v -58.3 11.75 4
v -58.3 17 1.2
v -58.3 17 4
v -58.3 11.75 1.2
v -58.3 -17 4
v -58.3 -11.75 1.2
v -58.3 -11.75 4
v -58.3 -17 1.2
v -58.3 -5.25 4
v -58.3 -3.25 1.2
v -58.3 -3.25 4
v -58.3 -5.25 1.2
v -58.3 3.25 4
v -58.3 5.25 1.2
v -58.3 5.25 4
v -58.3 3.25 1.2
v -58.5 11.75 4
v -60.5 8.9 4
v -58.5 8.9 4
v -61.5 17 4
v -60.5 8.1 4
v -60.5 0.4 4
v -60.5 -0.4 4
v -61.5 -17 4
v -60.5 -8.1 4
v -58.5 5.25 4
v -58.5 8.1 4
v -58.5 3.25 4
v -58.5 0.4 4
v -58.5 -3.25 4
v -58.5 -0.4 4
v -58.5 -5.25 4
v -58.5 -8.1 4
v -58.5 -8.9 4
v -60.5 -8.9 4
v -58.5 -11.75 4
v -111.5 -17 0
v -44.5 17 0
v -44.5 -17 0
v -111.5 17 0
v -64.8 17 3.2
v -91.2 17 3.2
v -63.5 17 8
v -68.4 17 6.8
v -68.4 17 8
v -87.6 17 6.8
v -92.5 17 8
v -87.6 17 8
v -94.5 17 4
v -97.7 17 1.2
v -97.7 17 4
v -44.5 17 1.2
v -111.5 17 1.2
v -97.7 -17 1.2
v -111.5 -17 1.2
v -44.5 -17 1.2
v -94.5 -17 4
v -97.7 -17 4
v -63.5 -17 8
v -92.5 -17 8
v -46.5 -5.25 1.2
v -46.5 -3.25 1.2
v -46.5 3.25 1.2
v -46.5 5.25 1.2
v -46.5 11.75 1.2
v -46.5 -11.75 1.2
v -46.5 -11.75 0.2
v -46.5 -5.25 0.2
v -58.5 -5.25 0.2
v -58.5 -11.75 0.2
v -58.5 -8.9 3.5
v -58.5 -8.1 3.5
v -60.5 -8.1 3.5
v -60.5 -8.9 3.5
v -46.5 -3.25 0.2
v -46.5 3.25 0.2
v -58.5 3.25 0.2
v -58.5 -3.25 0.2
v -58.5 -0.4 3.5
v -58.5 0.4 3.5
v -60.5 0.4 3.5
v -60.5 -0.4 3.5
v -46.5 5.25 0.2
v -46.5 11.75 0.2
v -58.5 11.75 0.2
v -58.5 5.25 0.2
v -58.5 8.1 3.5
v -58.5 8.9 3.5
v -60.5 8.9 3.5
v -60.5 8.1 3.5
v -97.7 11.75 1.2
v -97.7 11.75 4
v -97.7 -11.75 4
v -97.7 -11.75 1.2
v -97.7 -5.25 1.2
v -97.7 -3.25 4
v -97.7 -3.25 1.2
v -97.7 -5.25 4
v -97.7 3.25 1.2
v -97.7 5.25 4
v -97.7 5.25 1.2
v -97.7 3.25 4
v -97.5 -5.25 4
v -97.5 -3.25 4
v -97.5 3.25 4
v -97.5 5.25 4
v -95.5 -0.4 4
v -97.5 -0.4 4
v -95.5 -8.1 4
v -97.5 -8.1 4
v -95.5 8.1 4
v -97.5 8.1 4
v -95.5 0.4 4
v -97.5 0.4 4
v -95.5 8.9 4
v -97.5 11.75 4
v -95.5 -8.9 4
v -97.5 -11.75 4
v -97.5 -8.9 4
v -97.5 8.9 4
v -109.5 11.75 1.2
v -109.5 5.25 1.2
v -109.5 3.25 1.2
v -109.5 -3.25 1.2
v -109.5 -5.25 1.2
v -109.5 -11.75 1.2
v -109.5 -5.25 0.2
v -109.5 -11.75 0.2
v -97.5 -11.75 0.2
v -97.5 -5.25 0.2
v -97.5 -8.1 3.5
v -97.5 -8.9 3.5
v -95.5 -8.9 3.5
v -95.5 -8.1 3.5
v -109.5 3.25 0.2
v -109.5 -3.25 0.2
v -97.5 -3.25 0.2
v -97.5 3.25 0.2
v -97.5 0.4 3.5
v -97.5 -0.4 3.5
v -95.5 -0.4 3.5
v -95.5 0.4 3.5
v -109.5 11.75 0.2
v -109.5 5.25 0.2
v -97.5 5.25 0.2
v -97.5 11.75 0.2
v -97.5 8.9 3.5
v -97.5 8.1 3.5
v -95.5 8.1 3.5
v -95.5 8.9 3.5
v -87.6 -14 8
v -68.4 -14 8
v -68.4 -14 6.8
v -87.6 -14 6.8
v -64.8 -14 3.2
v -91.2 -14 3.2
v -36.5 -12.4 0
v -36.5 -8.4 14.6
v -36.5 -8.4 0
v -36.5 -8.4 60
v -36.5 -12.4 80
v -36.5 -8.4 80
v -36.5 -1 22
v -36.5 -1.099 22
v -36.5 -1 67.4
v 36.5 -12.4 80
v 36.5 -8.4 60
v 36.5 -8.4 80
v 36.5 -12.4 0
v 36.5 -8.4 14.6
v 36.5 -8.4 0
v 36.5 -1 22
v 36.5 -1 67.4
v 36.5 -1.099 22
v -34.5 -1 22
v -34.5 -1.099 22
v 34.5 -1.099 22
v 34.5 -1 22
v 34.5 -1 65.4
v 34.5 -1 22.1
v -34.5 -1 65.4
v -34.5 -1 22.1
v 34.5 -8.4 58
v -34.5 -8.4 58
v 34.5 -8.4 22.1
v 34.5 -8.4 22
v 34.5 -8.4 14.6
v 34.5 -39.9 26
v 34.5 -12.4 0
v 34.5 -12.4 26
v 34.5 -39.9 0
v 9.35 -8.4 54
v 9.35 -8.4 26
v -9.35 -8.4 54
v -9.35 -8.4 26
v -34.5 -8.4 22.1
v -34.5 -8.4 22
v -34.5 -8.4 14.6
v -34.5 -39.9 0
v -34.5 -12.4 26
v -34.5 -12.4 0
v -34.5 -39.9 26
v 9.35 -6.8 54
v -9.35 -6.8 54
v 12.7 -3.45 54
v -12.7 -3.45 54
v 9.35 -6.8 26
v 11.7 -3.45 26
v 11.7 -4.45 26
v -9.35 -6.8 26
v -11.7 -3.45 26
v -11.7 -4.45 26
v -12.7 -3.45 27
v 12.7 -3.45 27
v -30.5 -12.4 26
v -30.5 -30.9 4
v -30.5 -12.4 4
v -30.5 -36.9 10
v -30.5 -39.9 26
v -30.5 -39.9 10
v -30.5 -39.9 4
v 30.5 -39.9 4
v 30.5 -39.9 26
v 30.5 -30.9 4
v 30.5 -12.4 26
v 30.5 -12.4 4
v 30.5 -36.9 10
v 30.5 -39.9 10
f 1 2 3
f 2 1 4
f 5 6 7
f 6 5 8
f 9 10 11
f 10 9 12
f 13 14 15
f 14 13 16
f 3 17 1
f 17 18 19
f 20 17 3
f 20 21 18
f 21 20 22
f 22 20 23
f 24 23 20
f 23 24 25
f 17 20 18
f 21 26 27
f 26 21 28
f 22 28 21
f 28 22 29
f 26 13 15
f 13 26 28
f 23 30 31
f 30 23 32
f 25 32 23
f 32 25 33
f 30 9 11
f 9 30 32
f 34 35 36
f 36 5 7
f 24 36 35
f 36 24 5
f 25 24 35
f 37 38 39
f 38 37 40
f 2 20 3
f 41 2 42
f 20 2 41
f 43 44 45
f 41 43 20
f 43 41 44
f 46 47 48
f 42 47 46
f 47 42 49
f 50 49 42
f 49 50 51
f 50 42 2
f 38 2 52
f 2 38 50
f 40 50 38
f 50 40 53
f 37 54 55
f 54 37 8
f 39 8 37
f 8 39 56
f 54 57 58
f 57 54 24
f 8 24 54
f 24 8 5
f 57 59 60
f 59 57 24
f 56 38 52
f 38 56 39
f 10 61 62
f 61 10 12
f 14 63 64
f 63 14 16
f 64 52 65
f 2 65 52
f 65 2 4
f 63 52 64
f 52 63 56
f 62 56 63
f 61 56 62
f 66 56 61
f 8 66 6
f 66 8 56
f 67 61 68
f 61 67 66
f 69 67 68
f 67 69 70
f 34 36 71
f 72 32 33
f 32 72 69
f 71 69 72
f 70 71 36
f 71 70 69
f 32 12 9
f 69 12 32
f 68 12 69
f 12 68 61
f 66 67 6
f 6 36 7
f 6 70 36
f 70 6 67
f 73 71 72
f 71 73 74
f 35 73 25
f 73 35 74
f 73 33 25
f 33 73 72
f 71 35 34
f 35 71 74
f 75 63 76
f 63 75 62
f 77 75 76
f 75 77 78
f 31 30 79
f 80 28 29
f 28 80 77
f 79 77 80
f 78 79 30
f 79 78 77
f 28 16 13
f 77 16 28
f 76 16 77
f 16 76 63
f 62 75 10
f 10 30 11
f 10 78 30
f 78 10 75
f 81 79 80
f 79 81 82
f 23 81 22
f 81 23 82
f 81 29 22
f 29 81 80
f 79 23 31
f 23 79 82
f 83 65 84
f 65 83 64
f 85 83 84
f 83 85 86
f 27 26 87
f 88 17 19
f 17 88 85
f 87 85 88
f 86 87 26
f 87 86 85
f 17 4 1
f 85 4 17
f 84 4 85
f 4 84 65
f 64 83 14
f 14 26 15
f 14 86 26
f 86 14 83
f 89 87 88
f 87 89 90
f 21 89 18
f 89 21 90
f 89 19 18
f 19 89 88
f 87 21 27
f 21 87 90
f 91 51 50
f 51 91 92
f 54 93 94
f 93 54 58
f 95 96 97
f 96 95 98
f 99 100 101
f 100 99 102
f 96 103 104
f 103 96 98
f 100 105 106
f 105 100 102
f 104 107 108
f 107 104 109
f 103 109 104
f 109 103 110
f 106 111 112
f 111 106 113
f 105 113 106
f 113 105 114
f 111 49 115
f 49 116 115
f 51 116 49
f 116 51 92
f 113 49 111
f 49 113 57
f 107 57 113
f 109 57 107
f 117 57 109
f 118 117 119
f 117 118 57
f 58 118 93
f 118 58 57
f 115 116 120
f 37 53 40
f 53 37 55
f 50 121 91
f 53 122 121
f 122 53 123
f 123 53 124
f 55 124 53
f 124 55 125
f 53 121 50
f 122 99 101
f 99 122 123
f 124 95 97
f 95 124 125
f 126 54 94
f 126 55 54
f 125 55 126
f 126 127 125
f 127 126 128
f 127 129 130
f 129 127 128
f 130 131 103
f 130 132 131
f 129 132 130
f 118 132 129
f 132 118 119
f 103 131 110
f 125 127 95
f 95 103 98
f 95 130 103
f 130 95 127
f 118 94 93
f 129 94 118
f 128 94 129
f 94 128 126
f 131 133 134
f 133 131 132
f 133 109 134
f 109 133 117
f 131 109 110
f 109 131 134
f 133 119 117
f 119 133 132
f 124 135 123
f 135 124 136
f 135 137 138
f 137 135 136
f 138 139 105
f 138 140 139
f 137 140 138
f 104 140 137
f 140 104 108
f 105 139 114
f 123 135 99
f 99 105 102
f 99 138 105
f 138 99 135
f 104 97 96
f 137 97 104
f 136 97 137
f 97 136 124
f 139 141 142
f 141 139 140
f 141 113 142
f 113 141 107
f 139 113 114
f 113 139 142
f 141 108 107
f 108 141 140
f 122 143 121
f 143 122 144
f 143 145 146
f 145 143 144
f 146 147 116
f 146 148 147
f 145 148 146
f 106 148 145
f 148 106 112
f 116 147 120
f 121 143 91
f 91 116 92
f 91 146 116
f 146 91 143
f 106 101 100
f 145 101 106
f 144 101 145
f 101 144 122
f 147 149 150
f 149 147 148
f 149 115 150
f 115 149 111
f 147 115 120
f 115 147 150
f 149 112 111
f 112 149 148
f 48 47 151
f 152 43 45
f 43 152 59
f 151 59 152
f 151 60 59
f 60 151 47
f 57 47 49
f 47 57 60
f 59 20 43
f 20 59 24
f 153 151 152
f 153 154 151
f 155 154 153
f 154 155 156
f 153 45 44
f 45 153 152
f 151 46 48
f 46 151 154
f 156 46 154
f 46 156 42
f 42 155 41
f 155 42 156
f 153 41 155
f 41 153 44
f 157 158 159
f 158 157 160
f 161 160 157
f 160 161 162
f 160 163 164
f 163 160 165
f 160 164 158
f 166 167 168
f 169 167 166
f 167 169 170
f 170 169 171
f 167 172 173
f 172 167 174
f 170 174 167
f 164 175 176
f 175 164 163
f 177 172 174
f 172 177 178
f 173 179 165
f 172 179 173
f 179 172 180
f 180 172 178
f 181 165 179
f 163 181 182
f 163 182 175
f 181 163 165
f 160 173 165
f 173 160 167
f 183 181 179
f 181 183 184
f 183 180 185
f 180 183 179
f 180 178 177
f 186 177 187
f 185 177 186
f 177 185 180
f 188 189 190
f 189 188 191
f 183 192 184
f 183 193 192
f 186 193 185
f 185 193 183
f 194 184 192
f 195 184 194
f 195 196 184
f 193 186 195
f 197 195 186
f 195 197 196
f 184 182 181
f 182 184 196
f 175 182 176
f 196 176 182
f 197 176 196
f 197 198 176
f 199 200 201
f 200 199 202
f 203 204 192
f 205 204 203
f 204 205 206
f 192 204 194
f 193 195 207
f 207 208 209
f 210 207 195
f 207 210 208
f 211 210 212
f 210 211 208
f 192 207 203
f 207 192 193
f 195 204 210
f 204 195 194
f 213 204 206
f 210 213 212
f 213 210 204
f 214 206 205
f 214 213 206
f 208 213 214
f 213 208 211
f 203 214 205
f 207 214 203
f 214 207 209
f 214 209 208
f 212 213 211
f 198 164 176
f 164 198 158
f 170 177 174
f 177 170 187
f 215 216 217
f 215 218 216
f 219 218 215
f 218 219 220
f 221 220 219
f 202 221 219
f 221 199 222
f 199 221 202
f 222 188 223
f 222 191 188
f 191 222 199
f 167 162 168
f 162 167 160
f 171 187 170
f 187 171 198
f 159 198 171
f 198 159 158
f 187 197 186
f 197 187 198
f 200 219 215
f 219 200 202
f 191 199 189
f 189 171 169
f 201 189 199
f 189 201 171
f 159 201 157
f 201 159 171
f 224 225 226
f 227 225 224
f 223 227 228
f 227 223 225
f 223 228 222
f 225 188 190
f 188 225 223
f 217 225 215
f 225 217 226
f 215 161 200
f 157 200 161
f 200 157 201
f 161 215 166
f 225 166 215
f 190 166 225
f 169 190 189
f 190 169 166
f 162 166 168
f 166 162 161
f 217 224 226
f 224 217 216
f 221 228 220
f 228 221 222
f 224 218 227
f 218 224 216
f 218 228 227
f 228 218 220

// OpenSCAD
/* [Mount / 形状] */
// Shape on the removable cover. / カバーと一体にする形状
mount_style = 0; // [0:Device holder, 1:Flat plate, 2:Add to an STL]

// Front outline for Flat plate. / 平板を選んだときのカバーの外形
cover_outline = 0; // [0:Rectangle, 1:Rounded, 2:Tapered, 3:Arch]

// Device width, or plate or imported STL width along X. / 機器・平板・STLの幅
width_mm = 60; // [10:0.1:250]

// Backing plate height, or imported STL height along Y. / 背板またはSTLの高さ
height_mm = 80; // [20:0.1:250]

/* [Wall base / 壁側ベース] */
// Match the size of the base and cover. / ベースとカバーの共通サイズ
base_size = 0; // [0:S - 6 staples, 1:M - 12 staples, 2:L - 20 staples]

// Dovetail clearance per side. / あり溝の片側のすき間
slide_clearance_mm = 0.25; // [0.15:0.05:0.35]

/* [Device holder / 機器の受け] */
// Thickness where the device sits. / 受けに入る部分の厚み
device_thickness_mm = 18; // [2:0.1:65]

// Extra space at each side and in front of the device. / 左・右・手前それぞれのすき間
clearance_mm = 0.5; // [0.2:0.1:2]

// Height of the front lip above the seat. / 受けの底から前縁までの高さ
lip_height_mm = 6; // [4:0.1:16]

/* [Imported STL / 手持ちのSTL] */
// Use a closed mesh in mm, with its attachment face down (-Z). / 接着面が-Z側にある閉じたSTL
stl_file = "default.stl";

// Bounding-box center X, center Y and minimum Z. / STLの中心X、中心Y、底面Z
stl_origin_mm = [0.0, 0.0, 0.0]; // [:0.01:]

// Move the imported shape horizontally and vertically on the cover. / カバー上での左右・上下位置
stl_offset_mm = [0.0, 0.0]; // [:0.1:]

/* [Output / 出力] */
// Export print parts or a blank cover for designing in CAD. / 印刷用部品かCAD設計用カバーを選択
print_part = 0; // [0:Both parts, 1:Wall base only, 2:Removable cover only, 3:CAD cover template]

// OpenSCAD assembly view for Both parts. / Both partsを選んだときの組み付け表示
local_preview = 2; // [0:Print layout, 1:Installed, 2:Before sliding down]

/* [Hidden] */
// X is across the wall, Y is up, Z is out from the wall.
// The 67 mm base and the dovetail are the compact standard in modular.py.
rows = [3, 6, 10][base_size];
base_half_width = 33.5;
base_half_height = (8.5 + rows * 8.5) / 2;
core_half = 16.5;
base_face = 8;
window_left = 19.5;
window_width = 12;
window_height = 6.5;
window_pitch = 8.5;
membrane = 0.20;

groove_floor = 3.2;
groove_knee = 6.8;
groove_mouth = 9.6;
slide_bottom = -14;
slide_top = 14;
plate_back = 8.4;
plate_front = 12.4;
cover_back = 1;
cover_inner = base_half_width + 1;
cover_outer = cover_inner + 2;
cover_bottom = -base_half_height - 1;
cover_inner_top = base_half_height + 1;
cover_face_top = cover_inner_top + 2;
cover_rise = plate_back - cover_back;
cover_roof_top = cover_face_top + cover_rise;
outline_center = (cover_bottom + cover_roof_top) / 2;
has_outline = mount_style == 1 && cover_outline != 0;

side_wall = 4;
seat = 4;
holder_inner_width = width_mm + 2 * clearance_mm;
holder_width = holder_inner_width + 2 * side_wall;
lip_start = plate_front + device_thickness_mm + clearance_mm;
lip_top = seat + lip_height_mm;
holder_front = lip_start + lip_height_mm + 3;
guide_height = max(lip_top, min(26, height_mm));
front_half_width = max(cover_outer,
    mount_style == 0 ? holder_width / 2 :
    width_mm / 2 + (mount_style == 2 ? abs(stl_offset_mm.x) : 0));
holder_panel_bottom = min(-height_mm / 2, cover_bottom - cover_rise);
front_bottom = mount_style == 0 ? holder_panel_bottom :
    min(cover_bottom, -height_mm / 2 + (has_outline ? outline_center :
        mount_style == 2 ? stl_offset_mm.y : 0));

module box(x0, x1, y0, y1, z0, z1) {
    translate([x0, y0, z0]) cube([x1 - x0, y1 - y0, z1 - z0]);
}

module along_y(profile, bottom, top) {
    translate([0, top, 0]) rotate([90, 0, 0])
        linear_extrude(height = top - bottom) polygon(profile);
}

module across_x(profile, left, right) {
    translate([left, 0, 0]) rotate([90, 0, 90])
        linear_extrude(height = right - left) polygon(profile);
}

function dovetail(bottom, wide, narrow, top) = [
    [-wide, bottom], [wide, bottom], [narrow, groove_knee],
    [narrow, top], [-narrow, top], [-narrow, groove_knee]
];

module staple_wing() {
    difference() {
        union() {
            box(core_half - 0.4, window_left + 0.2, -base_half_height, base_half_height, 0, 4);
            box(window_left, base_half_width, -base_half_height, base_half_height, 0, 1.2);
        }
        for (i = [0 : rows - 1]) {
            y = (i - (rows - 1) / 2) * window_pitch;
            box(window_left, window_left + window_width, y - window_height / 2,
                y + window_height / 2, membrane, 5);
            box(window_left - 2, window_left + 0.2, y - 0.4, y + 0.4, 3.5, 5);
        }
    }
}

module wall_base() {
    difference() {
        union() {
            along_y([
                [-core_half, 0], [core_half, 0], [core_half, 4], [core_half - 2, base_face],
                [2 - core_half, base_face], [-core_half, 4]
            ], -base_half_height, base_half_height);
            staple_wing();
            mirror([1, 0, 0]) staple_wing();
        }
        along_y(dovetail(groove_floor, groove_mouth + groove_knee - groove_floor,
                         groove_mouth, base_face + 1), slide_bottom, base_half_height + 1);
    }
}

module sliding_tongue() {
    bottom = groove_floor + 0.25;
    narrow = groove_mouth - slide_clearance_mm;
    wide = narrow + groove_knee - bottom;
    intersection() {
        along_y(dovetail(bottom, wide, narrow, plate_back + 0.4), slide_bottom, slide_top);
        linear_extrude(height = plate_front) polygon([
            [-wide + 1, slide_bottom], [wide - 1, slide_bottom],
            [wide + 1, slide_bottom + 2], [wide + 1, slide_top],
            [-wide - 1, slide_top], [-wide - 1, slide_bottom + 2]
        ]);
    }
}

module covered_carrier() {
    difference() {
        across_x([
            [cover_bottom, cover_back], [cover_face_top + cover_rise, cover_back],
            [cover_face_top, plate_back], [cover_face_top, plate_front], [cover_bottom, plate_front]
        ], -cover_outer, cover_outer);
        across_x([
            [cover_bottom - 1, 0], [cover_inner_top + plate_back, 0],
            [cover_inner_top, plate_back], [cover_bottom - 1, plate_back]
        ], -cover_inner, cover_inner);
    }
    sliding_tongue();
}

module backing_plate(width) {
    box(-width / 2, width / 2, -height_mm / 2, height_mm / 2, plate_back, plate_front);
}

function cover_fits_outline(w, h, x, y, radius, rise, taper) =
    x <= w / 2 && y <= h / 2 && (
        cover_outline == 1 ?
            norm([max(0, x - (w / 2 - radius)), max(0, y - (h / 2 - radius))]) <= radius :
        cover_outline == 2 ?
            x <= w / 2 - taper * (0.5 + y / h) :
            pow(x / (w / 2), 2) + pow(max(0, y - (h / 2 - rise)) / rise, 2) <= 1
    );

module shaped_plate() {
    w = width_mm;
    h = height_mm;
    radius = 12;
    rise = h * 0.46;
    taper = w * 0.165;
    // Cover the full silhouette of the stock sleeve, including its rear roof.
    // Leave a small margin for polygonal arcs and mesh export.
    assert(cover_fits_outline(w, h, cover_outer + 0.08,
                             (cover_roof_top - cover_bottom) / 2 + 0.08,
                             radius, rise, taper),
           "Cover outline must hide the wall base. Increase width or height.");
    translate([0, outline_center, plate_back])
        linear_extrude(height = plate_front - plate_back) {
            if (cover_outline == 1)
                offset(r = radius, $fn = 120) square([w - 2 * radius, h - 2 * radius], center = true);
            else if (cover_outline == 2)
                polygon([[-w / 2, -h / 2], [w / 2, -h / 2], [w / 2 - taper, h / 2], [taper - w / 2, h / 2]]);
            else
                polygon(concat([[-w / 2, -h / 2], [w / 2, -h / 2]],
                    [for (angle = [0 : 3 : 180]) [w / 2 * cos(angle), h / 2 - rise + rise * sin(angle)]]));
        }
}

module device_holder() {
    y_bottom = -height_mm / 2;
    box(-front_half_width, front_half_width, holder_panel_bottom, max(height_mm / 2, cover_face_top),
        plate_back, plate_front);
    // Grow the lower side skirts from the front panel as the upright print rises.
    for (x = [-cover_outer, cover_inner])
        across_x([
            [cover_bottom - cover_rise, plate_back], [cover_bottom + 0.1, cover_back],
            [cover_bottom + 0.1, plate_back + 0.1], [cover_bottom - cover_rise, plate_back + 0.1]
        ], x, x + 2);
    box(-holder_width / 2, holder_width / 2, y_bottom, y_bottom + seat, plate_back, holder_front);
    for (x = [-holder_width / 2, holder_inner_width / 2])
        box(x, x + side_wall, y_bottom, y_bottom + guide_height, plate_back, holder_front);
    across_x([
        [y_bottom, lip_start], [y_bottom, holder_front], [y_bottom + lip_top, holder_front],
        [y_bottom + lip_top, holder_front - 3], [y_bottom + seat, lip_start]
    ], -holder_width / 2, holder_width / 2);
}

module removable_cover() {
    union() {
        covered_carrier();
        if (mount_style == 0) {
            device_holder();
        } else if (mount_style == 1) {
            if (has_outline)
                shaped_plate();
            else
                backing_plate(width_mm);
        } else {
            assert(stl_file != "default.stl" && stl_file != "", "Upload your STL first.");
            assert(abs(stl_offset_mm.x) < (width_mm / 2 + cover_outer) &&
                   stl_offset_mm.y - height_mm / 2 < cover_face_top &&
                   stl_offset_mm.y + height_mm / 2 > cover_bottom,
                   "Move the STL onto the front of the cover.");
            translate([stl_offset_mm.x, stl_offset_mm.y, plate_front - 0.6] - stl_origin_mm)
                import(file = stl_file, convexity = 10);
        }
    }
}

module print_cover() {
    if (mount_style == 1)
        translate([0, 0, plate_front]) rotate([180, 0, 0]) removable_cover();
    else
        translate([0, 0, -front_bottom]) rotate([90, 0, 0]) removable_cover();
}

assert(mount_style == 0 || mount_style == 1 || mount_style == 2, "Choose a mount shape.");
assert(cover_outline == 0 || cover_outline == 1 || cover_outline == 2 || cover_outline == 3,
       "Choose a cover outline.");
assert(print_part == 0 || print_part == 1 || print_part == 2 || print_part == 3, "Choose an output.");
assert(base_size == 0 || base_size == 1 || base_size == 2, "Choose base size S, M or L.");
assert(slide_clearance_mm >= 0.15 && slide_clearance_mm <= 0.35, "Set slide clearance to 0.15–0.35 mm.");
assert(width_mm >= 10 && width_mm <= 250 && height_mm >= 20 && height_mm <= 250, "Check width and height.");
assert(mount_style != 0 || (device_thickness_mm >= 2 && device_thickness_mm <= 65 &&
       clearance_mm >= 0.2 && clearance_mm <= 2 && lip_height_mm >= 4 && lip_height_mm <= 16),
       "Check device thickness, clearance and lip height.");

if (print_part == 3) {
    // CAD reference: the mounting face is Z=0, +Y points up on the wall.
    translate([0, 0, -plate_front]) covered_carrier();
} else if ($preview && local_preview != 0 && print_part == 0) {
    color("#607784") wall_base();
    lift = local_preview == 2 ? base_half_height - front_bottom + 18 : 0;
    color("#e2a45f") translate([0, lift, 0]) removable_cover();
} else {
    if (print_part == 0)
        translate([-front_half_width - base_half_width - 8, 0, 0]) wall_base();
    else if (print_part == 1)
        wall_base();
    if (print_part != 1) print_cover();
}
